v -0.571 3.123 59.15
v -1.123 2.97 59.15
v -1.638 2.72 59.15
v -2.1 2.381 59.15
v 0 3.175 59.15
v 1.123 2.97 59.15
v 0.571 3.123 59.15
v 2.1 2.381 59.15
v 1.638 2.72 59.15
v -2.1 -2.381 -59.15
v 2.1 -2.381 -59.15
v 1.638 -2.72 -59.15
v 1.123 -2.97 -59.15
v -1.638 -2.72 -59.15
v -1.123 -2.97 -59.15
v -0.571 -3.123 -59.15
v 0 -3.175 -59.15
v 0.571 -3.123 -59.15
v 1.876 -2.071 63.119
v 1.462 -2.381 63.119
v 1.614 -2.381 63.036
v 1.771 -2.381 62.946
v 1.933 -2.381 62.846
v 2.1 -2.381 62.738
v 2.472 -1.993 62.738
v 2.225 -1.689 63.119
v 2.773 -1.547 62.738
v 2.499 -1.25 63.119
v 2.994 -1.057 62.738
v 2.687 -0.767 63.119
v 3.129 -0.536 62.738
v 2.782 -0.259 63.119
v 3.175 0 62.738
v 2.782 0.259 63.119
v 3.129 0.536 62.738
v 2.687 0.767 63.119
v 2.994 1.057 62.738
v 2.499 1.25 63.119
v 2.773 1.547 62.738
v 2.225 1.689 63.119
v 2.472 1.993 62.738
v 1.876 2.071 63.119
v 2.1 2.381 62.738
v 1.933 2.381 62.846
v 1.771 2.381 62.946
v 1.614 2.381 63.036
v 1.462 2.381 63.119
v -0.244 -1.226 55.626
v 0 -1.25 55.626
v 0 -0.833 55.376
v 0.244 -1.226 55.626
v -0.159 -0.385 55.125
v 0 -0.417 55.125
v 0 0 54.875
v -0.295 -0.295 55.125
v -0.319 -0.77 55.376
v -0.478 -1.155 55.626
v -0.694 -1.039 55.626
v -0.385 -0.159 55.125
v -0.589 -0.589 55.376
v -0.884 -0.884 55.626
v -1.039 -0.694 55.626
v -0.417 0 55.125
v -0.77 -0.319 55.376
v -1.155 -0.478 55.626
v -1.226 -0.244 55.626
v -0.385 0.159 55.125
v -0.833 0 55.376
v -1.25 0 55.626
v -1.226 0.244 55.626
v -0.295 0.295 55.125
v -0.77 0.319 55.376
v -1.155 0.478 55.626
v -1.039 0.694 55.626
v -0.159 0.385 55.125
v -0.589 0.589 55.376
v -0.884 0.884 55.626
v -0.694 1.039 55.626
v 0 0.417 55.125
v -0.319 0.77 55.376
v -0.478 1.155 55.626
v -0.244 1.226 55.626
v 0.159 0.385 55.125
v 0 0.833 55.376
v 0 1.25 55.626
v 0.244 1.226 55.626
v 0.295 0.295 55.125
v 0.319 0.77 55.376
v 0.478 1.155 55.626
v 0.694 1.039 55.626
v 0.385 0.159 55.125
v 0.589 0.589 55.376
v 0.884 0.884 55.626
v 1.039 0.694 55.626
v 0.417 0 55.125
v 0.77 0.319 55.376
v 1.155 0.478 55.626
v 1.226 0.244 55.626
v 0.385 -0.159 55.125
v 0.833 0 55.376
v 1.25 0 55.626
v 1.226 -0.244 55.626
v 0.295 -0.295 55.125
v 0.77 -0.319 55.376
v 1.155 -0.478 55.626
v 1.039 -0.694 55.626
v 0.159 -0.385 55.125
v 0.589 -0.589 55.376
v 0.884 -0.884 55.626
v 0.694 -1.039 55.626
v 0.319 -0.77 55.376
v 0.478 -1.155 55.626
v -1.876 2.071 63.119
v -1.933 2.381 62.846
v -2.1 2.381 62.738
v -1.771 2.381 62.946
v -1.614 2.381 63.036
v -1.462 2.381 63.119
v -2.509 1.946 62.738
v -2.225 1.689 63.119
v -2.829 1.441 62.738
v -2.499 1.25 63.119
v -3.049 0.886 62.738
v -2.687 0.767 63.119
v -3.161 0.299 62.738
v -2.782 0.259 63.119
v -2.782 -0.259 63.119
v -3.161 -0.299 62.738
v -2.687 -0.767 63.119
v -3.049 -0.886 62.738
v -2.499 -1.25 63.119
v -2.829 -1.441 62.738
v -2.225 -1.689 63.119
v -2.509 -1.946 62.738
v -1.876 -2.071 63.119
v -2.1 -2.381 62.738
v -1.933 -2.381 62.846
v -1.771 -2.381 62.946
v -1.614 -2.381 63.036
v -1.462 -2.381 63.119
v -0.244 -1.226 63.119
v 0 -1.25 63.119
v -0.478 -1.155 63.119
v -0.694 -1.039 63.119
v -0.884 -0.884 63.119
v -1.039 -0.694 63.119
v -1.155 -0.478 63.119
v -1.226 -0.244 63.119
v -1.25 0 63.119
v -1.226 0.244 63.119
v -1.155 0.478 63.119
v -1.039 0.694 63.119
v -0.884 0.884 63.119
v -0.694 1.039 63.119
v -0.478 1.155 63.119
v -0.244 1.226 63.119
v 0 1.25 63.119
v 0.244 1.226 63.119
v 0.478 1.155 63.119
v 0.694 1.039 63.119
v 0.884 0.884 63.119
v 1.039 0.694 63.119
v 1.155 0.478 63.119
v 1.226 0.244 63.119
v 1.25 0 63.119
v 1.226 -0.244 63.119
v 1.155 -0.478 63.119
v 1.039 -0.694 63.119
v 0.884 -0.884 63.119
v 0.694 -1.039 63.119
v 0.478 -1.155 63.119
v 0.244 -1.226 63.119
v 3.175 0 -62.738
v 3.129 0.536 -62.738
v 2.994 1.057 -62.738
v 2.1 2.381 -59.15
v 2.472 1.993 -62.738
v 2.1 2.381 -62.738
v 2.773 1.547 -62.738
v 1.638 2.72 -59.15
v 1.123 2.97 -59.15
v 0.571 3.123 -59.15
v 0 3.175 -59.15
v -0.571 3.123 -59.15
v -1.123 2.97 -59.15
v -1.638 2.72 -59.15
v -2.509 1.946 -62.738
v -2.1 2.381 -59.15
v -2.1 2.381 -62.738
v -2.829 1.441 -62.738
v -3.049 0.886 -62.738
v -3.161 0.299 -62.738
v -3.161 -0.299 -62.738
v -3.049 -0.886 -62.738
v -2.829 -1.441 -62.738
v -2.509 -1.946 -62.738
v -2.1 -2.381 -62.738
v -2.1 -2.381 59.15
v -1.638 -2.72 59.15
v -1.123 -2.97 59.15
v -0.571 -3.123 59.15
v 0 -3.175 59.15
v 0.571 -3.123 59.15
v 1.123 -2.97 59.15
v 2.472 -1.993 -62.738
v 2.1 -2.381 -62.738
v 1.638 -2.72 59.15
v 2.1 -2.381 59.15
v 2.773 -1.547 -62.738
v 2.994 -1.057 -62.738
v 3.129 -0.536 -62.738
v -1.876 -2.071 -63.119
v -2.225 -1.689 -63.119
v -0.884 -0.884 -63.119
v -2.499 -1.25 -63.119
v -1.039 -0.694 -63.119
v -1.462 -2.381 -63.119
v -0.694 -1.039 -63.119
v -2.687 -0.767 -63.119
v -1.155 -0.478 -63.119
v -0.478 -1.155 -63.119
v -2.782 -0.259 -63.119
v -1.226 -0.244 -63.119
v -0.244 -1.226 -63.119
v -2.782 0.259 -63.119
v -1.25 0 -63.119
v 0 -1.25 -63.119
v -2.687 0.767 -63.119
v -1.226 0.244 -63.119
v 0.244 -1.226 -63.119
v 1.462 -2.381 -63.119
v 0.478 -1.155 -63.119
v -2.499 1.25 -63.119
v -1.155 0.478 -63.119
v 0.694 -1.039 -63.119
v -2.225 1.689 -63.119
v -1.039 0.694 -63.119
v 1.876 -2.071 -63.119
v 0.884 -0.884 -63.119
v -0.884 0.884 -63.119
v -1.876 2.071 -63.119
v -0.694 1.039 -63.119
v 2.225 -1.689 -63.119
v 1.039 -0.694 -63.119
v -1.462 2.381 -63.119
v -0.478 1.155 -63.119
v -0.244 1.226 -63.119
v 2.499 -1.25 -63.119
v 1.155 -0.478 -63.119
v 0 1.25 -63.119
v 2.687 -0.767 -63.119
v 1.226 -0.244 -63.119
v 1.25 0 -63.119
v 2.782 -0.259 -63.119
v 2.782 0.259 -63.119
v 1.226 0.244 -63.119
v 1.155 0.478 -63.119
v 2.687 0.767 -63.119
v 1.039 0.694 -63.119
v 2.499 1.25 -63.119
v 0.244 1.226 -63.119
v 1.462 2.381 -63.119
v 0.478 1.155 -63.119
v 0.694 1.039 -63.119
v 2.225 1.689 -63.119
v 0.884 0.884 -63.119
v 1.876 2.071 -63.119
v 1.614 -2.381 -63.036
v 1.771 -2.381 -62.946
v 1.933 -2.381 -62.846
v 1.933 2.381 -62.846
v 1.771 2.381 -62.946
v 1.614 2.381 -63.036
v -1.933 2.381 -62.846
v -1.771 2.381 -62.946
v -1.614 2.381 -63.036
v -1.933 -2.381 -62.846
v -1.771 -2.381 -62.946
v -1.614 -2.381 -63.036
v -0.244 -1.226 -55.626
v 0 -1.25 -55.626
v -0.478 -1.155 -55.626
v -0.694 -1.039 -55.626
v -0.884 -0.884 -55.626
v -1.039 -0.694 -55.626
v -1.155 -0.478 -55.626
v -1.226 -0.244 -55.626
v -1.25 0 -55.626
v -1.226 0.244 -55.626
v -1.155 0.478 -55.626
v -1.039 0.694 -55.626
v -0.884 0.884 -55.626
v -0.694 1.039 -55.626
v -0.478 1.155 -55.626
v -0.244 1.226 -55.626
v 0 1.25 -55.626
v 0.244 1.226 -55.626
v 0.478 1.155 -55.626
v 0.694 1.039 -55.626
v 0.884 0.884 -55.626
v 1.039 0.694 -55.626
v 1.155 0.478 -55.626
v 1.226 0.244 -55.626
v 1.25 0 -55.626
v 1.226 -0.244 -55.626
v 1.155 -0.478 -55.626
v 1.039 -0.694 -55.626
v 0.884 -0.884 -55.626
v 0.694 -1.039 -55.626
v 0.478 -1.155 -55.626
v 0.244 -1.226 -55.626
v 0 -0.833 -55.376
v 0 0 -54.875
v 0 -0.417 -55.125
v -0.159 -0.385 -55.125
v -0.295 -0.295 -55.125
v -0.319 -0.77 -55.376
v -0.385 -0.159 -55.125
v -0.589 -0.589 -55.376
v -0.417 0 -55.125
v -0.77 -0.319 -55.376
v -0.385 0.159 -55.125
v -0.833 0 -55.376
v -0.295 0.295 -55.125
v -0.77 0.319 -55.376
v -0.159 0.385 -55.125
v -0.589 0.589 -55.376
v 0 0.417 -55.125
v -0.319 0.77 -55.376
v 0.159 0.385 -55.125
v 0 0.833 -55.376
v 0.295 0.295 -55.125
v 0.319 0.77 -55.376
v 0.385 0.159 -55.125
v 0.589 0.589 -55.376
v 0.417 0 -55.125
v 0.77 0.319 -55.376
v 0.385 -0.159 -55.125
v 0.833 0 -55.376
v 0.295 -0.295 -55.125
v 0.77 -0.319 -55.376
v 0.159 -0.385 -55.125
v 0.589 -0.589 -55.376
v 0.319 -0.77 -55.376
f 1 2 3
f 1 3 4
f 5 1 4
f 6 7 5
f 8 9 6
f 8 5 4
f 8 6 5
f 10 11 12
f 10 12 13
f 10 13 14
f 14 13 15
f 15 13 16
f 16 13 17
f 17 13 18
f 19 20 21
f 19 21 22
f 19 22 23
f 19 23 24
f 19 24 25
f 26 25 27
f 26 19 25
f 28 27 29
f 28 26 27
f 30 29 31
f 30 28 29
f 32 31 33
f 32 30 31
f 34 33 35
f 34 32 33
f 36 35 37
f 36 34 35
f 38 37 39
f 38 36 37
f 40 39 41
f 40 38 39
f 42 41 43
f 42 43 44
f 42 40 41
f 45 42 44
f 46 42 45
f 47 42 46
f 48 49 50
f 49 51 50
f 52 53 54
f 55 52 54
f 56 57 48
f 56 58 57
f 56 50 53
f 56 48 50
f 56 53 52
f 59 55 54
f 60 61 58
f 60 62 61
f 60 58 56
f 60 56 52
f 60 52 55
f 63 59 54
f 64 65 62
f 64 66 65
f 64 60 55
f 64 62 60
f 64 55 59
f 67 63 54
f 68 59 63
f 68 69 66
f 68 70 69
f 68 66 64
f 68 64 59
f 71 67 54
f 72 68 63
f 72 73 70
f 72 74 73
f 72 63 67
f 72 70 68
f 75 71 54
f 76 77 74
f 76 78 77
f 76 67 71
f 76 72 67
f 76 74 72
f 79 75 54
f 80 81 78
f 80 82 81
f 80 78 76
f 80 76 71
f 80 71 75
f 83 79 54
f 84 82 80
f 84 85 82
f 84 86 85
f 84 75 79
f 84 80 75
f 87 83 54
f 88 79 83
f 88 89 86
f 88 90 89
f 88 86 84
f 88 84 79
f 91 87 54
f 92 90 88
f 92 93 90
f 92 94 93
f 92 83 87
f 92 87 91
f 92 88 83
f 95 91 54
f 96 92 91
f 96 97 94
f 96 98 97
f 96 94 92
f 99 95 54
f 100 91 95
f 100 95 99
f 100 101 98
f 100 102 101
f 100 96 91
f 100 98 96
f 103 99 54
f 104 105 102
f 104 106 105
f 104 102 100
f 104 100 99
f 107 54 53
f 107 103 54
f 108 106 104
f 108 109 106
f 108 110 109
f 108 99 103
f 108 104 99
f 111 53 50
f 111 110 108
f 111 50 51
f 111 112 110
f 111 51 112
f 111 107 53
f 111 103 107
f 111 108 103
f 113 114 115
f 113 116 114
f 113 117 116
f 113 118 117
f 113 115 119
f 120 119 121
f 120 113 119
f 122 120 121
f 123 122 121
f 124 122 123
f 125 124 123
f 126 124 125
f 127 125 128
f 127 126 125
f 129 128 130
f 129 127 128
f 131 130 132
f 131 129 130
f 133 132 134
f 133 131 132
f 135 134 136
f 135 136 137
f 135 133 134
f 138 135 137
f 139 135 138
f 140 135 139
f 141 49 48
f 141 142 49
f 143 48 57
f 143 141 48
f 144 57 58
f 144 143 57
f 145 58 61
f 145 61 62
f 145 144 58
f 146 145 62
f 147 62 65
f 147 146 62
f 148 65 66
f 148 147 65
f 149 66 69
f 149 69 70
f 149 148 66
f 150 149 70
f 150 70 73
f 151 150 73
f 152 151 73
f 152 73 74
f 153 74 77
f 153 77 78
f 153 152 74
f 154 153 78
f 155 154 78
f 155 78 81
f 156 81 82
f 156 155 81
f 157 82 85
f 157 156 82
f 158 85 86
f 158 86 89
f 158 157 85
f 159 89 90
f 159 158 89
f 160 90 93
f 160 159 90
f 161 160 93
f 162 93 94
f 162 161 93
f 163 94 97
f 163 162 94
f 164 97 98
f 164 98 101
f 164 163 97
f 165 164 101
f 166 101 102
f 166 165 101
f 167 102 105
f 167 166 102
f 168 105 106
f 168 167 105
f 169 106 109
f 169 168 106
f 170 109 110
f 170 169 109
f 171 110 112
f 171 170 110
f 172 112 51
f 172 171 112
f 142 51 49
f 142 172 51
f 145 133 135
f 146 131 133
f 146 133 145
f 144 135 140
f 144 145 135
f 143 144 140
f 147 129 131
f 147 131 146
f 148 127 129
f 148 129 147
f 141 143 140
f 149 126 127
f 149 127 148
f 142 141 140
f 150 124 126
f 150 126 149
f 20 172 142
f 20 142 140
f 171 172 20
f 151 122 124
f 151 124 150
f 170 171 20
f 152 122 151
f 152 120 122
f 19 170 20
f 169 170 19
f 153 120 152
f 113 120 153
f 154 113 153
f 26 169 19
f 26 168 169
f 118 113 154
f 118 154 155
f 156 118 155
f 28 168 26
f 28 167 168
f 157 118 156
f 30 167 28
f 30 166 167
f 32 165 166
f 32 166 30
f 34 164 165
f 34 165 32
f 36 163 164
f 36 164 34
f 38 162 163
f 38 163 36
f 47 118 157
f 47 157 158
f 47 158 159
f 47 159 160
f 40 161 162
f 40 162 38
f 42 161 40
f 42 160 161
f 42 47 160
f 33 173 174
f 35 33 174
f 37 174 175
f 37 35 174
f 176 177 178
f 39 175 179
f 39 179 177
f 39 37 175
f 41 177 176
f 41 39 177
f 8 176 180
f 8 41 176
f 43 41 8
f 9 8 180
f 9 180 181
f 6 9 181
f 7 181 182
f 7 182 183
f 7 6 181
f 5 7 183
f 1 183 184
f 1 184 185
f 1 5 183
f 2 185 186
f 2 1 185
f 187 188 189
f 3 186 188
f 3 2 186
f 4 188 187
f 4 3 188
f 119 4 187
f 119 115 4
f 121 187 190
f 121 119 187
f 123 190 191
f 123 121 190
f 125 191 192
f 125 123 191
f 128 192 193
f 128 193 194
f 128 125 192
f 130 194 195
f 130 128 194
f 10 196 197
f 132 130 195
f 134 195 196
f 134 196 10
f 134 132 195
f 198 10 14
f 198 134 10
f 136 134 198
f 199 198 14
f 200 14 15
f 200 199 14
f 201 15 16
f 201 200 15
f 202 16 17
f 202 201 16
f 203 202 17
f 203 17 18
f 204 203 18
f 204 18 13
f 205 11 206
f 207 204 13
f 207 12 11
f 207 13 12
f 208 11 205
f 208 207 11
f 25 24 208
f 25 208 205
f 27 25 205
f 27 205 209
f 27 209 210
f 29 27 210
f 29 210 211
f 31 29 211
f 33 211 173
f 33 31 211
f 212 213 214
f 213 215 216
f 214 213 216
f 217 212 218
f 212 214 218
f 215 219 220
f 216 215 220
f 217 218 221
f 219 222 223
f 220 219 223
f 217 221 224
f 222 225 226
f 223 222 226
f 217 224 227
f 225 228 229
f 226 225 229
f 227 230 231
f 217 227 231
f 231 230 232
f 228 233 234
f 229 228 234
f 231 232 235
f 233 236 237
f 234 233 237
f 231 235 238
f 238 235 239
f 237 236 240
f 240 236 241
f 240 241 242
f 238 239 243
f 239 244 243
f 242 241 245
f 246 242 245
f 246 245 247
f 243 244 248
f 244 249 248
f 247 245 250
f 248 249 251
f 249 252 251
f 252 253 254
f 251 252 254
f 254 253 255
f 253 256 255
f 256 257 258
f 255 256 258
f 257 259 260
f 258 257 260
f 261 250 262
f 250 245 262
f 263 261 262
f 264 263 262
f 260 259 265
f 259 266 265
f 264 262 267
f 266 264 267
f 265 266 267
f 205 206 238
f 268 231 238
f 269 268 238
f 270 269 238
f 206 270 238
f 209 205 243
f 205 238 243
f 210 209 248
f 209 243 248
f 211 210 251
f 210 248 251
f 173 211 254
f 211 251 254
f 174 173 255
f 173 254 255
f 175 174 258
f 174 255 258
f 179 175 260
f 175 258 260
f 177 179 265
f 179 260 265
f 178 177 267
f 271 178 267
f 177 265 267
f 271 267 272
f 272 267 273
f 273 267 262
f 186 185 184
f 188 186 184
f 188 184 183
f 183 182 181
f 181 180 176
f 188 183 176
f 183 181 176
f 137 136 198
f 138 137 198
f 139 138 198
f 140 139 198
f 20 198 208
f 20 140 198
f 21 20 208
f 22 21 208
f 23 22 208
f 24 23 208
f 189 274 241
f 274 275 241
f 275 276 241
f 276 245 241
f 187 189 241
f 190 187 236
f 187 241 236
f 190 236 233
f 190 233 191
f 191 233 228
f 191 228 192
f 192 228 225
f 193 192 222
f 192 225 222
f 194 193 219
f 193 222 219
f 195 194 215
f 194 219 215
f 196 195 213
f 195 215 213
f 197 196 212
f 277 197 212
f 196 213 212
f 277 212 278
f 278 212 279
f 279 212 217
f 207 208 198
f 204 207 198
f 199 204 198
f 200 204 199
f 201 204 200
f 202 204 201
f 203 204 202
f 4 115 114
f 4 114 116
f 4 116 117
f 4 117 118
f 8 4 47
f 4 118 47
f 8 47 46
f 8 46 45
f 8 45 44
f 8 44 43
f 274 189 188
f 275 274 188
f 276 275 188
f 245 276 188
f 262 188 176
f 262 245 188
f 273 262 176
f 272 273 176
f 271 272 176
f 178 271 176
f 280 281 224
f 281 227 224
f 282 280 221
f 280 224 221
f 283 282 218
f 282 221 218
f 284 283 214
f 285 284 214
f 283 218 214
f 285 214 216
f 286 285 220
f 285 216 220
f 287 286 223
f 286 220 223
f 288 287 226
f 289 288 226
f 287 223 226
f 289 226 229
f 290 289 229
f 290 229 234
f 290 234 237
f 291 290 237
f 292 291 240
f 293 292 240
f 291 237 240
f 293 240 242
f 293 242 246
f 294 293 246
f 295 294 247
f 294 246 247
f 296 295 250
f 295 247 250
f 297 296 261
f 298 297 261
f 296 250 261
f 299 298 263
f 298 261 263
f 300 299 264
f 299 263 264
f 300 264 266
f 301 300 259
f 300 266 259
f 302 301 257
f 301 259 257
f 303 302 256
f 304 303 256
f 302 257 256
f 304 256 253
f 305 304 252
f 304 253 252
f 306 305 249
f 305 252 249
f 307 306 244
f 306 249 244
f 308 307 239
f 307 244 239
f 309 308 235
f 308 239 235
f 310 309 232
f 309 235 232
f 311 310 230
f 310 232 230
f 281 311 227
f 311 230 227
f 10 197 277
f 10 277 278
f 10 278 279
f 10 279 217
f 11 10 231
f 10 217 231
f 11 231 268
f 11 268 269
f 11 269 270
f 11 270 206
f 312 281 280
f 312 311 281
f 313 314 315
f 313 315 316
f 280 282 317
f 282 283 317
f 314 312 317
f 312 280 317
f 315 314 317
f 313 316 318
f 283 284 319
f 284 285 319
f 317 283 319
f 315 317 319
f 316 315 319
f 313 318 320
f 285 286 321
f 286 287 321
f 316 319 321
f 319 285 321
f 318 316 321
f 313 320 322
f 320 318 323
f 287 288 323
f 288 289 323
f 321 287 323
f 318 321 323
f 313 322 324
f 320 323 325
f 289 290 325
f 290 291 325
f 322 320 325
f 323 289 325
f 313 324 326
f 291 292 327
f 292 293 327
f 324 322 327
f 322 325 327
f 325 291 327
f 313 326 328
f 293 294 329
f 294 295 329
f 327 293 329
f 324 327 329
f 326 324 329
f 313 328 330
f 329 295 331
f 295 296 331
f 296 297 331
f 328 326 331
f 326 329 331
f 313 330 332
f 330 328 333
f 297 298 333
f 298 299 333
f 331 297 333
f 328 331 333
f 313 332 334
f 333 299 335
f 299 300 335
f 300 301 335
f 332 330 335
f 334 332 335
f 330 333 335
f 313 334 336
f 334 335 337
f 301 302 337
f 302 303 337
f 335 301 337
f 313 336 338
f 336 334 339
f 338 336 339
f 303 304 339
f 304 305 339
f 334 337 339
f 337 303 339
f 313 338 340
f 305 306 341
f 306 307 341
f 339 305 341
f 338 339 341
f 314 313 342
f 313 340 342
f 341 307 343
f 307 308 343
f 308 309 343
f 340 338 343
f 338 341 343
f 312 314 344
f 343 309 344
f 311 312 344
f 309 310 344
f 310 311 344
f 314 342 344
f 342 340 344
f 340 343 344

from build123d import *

# Parameters (mm, degrees)
SKETCH1_R           = 3.175
BOSS_EXTRUDE1_DEPTH = 63.119
CHAMFER1_SIZE       = 0.381
CUT_EXTRUDE1_DEPTH  = 3.96875


with BuildPart() as part:
    # Sketch1 → Boss-Extrude1 (new body, symmetric)
    with BuildSketch(Plane.XY):
        Circle(SKETCH1_R)
    extrude(amount=BOSS_EXTRUDE1_DEPTH, both=True)

    # Sketch4 → M3x0.5 Tapped Hole1 (revolve, cut)
    with BuildSketch(Plane(origin=(0, 0, 63.119), x_dir=(0, -1, 0), z_dir=(1, 0, 0))):
        Polygon((0, 0), (0, 8.244075774), (1.25, 7.493), (1.25, 0), align=None)
    m3x0_5_tapped_hole1 = revolve(axis=Axis((0, 0, 69.469), (0, 0, -1)), mode=Mode.SUBTRACT)

    # Chamfer1
    chamfer1_edges = [part.edges().sort_by_distance(p)[0] for p in [
        (-3.175, 0, -63.119),
        (-3.175, 0, 63.119),
    ]]
    chamfer(chamfer1_edges, length=CHAMFER1_SIZE)

    # Mirror1: M3x0.5 Tapped Hole1 across plane
    add(m3x0_5_tapped_hole1.mirror(Plane.XY), mode=Mode.SUBTRACT)

    # Sketch5 → Cut-Extrude1 (cut)
    with BuildSketch(Plane.XY.offset(63.119)):
        with BuildLine():
            Line((-2.100065103, 2.38125), (2.100065103, 2.38125))
            ThreePointArc((2.100065103, 2.38125), (0, 3.175), (-2.100065103, 2.38125))
        make_face()
        with BuildLine():
            Line((-2.100065103, -2.38125), (2.100065103, -2.38125))
            ThreePointArc((2.100065103, -2.38125), (0, -3.175), (-2.100065103, -2.38125))
        make_face()
    cut_extrude1 = extrude(amount=-CUT_EXTRUDE1_DEPTH, mode=Mode.SUBTRACT)

    # Mirror2: Cut-Extrude1 across plane
    add(cut_extrude1.mirror(Plane.XY), mode=Mode.SUBTRACT)


solid = part.part
